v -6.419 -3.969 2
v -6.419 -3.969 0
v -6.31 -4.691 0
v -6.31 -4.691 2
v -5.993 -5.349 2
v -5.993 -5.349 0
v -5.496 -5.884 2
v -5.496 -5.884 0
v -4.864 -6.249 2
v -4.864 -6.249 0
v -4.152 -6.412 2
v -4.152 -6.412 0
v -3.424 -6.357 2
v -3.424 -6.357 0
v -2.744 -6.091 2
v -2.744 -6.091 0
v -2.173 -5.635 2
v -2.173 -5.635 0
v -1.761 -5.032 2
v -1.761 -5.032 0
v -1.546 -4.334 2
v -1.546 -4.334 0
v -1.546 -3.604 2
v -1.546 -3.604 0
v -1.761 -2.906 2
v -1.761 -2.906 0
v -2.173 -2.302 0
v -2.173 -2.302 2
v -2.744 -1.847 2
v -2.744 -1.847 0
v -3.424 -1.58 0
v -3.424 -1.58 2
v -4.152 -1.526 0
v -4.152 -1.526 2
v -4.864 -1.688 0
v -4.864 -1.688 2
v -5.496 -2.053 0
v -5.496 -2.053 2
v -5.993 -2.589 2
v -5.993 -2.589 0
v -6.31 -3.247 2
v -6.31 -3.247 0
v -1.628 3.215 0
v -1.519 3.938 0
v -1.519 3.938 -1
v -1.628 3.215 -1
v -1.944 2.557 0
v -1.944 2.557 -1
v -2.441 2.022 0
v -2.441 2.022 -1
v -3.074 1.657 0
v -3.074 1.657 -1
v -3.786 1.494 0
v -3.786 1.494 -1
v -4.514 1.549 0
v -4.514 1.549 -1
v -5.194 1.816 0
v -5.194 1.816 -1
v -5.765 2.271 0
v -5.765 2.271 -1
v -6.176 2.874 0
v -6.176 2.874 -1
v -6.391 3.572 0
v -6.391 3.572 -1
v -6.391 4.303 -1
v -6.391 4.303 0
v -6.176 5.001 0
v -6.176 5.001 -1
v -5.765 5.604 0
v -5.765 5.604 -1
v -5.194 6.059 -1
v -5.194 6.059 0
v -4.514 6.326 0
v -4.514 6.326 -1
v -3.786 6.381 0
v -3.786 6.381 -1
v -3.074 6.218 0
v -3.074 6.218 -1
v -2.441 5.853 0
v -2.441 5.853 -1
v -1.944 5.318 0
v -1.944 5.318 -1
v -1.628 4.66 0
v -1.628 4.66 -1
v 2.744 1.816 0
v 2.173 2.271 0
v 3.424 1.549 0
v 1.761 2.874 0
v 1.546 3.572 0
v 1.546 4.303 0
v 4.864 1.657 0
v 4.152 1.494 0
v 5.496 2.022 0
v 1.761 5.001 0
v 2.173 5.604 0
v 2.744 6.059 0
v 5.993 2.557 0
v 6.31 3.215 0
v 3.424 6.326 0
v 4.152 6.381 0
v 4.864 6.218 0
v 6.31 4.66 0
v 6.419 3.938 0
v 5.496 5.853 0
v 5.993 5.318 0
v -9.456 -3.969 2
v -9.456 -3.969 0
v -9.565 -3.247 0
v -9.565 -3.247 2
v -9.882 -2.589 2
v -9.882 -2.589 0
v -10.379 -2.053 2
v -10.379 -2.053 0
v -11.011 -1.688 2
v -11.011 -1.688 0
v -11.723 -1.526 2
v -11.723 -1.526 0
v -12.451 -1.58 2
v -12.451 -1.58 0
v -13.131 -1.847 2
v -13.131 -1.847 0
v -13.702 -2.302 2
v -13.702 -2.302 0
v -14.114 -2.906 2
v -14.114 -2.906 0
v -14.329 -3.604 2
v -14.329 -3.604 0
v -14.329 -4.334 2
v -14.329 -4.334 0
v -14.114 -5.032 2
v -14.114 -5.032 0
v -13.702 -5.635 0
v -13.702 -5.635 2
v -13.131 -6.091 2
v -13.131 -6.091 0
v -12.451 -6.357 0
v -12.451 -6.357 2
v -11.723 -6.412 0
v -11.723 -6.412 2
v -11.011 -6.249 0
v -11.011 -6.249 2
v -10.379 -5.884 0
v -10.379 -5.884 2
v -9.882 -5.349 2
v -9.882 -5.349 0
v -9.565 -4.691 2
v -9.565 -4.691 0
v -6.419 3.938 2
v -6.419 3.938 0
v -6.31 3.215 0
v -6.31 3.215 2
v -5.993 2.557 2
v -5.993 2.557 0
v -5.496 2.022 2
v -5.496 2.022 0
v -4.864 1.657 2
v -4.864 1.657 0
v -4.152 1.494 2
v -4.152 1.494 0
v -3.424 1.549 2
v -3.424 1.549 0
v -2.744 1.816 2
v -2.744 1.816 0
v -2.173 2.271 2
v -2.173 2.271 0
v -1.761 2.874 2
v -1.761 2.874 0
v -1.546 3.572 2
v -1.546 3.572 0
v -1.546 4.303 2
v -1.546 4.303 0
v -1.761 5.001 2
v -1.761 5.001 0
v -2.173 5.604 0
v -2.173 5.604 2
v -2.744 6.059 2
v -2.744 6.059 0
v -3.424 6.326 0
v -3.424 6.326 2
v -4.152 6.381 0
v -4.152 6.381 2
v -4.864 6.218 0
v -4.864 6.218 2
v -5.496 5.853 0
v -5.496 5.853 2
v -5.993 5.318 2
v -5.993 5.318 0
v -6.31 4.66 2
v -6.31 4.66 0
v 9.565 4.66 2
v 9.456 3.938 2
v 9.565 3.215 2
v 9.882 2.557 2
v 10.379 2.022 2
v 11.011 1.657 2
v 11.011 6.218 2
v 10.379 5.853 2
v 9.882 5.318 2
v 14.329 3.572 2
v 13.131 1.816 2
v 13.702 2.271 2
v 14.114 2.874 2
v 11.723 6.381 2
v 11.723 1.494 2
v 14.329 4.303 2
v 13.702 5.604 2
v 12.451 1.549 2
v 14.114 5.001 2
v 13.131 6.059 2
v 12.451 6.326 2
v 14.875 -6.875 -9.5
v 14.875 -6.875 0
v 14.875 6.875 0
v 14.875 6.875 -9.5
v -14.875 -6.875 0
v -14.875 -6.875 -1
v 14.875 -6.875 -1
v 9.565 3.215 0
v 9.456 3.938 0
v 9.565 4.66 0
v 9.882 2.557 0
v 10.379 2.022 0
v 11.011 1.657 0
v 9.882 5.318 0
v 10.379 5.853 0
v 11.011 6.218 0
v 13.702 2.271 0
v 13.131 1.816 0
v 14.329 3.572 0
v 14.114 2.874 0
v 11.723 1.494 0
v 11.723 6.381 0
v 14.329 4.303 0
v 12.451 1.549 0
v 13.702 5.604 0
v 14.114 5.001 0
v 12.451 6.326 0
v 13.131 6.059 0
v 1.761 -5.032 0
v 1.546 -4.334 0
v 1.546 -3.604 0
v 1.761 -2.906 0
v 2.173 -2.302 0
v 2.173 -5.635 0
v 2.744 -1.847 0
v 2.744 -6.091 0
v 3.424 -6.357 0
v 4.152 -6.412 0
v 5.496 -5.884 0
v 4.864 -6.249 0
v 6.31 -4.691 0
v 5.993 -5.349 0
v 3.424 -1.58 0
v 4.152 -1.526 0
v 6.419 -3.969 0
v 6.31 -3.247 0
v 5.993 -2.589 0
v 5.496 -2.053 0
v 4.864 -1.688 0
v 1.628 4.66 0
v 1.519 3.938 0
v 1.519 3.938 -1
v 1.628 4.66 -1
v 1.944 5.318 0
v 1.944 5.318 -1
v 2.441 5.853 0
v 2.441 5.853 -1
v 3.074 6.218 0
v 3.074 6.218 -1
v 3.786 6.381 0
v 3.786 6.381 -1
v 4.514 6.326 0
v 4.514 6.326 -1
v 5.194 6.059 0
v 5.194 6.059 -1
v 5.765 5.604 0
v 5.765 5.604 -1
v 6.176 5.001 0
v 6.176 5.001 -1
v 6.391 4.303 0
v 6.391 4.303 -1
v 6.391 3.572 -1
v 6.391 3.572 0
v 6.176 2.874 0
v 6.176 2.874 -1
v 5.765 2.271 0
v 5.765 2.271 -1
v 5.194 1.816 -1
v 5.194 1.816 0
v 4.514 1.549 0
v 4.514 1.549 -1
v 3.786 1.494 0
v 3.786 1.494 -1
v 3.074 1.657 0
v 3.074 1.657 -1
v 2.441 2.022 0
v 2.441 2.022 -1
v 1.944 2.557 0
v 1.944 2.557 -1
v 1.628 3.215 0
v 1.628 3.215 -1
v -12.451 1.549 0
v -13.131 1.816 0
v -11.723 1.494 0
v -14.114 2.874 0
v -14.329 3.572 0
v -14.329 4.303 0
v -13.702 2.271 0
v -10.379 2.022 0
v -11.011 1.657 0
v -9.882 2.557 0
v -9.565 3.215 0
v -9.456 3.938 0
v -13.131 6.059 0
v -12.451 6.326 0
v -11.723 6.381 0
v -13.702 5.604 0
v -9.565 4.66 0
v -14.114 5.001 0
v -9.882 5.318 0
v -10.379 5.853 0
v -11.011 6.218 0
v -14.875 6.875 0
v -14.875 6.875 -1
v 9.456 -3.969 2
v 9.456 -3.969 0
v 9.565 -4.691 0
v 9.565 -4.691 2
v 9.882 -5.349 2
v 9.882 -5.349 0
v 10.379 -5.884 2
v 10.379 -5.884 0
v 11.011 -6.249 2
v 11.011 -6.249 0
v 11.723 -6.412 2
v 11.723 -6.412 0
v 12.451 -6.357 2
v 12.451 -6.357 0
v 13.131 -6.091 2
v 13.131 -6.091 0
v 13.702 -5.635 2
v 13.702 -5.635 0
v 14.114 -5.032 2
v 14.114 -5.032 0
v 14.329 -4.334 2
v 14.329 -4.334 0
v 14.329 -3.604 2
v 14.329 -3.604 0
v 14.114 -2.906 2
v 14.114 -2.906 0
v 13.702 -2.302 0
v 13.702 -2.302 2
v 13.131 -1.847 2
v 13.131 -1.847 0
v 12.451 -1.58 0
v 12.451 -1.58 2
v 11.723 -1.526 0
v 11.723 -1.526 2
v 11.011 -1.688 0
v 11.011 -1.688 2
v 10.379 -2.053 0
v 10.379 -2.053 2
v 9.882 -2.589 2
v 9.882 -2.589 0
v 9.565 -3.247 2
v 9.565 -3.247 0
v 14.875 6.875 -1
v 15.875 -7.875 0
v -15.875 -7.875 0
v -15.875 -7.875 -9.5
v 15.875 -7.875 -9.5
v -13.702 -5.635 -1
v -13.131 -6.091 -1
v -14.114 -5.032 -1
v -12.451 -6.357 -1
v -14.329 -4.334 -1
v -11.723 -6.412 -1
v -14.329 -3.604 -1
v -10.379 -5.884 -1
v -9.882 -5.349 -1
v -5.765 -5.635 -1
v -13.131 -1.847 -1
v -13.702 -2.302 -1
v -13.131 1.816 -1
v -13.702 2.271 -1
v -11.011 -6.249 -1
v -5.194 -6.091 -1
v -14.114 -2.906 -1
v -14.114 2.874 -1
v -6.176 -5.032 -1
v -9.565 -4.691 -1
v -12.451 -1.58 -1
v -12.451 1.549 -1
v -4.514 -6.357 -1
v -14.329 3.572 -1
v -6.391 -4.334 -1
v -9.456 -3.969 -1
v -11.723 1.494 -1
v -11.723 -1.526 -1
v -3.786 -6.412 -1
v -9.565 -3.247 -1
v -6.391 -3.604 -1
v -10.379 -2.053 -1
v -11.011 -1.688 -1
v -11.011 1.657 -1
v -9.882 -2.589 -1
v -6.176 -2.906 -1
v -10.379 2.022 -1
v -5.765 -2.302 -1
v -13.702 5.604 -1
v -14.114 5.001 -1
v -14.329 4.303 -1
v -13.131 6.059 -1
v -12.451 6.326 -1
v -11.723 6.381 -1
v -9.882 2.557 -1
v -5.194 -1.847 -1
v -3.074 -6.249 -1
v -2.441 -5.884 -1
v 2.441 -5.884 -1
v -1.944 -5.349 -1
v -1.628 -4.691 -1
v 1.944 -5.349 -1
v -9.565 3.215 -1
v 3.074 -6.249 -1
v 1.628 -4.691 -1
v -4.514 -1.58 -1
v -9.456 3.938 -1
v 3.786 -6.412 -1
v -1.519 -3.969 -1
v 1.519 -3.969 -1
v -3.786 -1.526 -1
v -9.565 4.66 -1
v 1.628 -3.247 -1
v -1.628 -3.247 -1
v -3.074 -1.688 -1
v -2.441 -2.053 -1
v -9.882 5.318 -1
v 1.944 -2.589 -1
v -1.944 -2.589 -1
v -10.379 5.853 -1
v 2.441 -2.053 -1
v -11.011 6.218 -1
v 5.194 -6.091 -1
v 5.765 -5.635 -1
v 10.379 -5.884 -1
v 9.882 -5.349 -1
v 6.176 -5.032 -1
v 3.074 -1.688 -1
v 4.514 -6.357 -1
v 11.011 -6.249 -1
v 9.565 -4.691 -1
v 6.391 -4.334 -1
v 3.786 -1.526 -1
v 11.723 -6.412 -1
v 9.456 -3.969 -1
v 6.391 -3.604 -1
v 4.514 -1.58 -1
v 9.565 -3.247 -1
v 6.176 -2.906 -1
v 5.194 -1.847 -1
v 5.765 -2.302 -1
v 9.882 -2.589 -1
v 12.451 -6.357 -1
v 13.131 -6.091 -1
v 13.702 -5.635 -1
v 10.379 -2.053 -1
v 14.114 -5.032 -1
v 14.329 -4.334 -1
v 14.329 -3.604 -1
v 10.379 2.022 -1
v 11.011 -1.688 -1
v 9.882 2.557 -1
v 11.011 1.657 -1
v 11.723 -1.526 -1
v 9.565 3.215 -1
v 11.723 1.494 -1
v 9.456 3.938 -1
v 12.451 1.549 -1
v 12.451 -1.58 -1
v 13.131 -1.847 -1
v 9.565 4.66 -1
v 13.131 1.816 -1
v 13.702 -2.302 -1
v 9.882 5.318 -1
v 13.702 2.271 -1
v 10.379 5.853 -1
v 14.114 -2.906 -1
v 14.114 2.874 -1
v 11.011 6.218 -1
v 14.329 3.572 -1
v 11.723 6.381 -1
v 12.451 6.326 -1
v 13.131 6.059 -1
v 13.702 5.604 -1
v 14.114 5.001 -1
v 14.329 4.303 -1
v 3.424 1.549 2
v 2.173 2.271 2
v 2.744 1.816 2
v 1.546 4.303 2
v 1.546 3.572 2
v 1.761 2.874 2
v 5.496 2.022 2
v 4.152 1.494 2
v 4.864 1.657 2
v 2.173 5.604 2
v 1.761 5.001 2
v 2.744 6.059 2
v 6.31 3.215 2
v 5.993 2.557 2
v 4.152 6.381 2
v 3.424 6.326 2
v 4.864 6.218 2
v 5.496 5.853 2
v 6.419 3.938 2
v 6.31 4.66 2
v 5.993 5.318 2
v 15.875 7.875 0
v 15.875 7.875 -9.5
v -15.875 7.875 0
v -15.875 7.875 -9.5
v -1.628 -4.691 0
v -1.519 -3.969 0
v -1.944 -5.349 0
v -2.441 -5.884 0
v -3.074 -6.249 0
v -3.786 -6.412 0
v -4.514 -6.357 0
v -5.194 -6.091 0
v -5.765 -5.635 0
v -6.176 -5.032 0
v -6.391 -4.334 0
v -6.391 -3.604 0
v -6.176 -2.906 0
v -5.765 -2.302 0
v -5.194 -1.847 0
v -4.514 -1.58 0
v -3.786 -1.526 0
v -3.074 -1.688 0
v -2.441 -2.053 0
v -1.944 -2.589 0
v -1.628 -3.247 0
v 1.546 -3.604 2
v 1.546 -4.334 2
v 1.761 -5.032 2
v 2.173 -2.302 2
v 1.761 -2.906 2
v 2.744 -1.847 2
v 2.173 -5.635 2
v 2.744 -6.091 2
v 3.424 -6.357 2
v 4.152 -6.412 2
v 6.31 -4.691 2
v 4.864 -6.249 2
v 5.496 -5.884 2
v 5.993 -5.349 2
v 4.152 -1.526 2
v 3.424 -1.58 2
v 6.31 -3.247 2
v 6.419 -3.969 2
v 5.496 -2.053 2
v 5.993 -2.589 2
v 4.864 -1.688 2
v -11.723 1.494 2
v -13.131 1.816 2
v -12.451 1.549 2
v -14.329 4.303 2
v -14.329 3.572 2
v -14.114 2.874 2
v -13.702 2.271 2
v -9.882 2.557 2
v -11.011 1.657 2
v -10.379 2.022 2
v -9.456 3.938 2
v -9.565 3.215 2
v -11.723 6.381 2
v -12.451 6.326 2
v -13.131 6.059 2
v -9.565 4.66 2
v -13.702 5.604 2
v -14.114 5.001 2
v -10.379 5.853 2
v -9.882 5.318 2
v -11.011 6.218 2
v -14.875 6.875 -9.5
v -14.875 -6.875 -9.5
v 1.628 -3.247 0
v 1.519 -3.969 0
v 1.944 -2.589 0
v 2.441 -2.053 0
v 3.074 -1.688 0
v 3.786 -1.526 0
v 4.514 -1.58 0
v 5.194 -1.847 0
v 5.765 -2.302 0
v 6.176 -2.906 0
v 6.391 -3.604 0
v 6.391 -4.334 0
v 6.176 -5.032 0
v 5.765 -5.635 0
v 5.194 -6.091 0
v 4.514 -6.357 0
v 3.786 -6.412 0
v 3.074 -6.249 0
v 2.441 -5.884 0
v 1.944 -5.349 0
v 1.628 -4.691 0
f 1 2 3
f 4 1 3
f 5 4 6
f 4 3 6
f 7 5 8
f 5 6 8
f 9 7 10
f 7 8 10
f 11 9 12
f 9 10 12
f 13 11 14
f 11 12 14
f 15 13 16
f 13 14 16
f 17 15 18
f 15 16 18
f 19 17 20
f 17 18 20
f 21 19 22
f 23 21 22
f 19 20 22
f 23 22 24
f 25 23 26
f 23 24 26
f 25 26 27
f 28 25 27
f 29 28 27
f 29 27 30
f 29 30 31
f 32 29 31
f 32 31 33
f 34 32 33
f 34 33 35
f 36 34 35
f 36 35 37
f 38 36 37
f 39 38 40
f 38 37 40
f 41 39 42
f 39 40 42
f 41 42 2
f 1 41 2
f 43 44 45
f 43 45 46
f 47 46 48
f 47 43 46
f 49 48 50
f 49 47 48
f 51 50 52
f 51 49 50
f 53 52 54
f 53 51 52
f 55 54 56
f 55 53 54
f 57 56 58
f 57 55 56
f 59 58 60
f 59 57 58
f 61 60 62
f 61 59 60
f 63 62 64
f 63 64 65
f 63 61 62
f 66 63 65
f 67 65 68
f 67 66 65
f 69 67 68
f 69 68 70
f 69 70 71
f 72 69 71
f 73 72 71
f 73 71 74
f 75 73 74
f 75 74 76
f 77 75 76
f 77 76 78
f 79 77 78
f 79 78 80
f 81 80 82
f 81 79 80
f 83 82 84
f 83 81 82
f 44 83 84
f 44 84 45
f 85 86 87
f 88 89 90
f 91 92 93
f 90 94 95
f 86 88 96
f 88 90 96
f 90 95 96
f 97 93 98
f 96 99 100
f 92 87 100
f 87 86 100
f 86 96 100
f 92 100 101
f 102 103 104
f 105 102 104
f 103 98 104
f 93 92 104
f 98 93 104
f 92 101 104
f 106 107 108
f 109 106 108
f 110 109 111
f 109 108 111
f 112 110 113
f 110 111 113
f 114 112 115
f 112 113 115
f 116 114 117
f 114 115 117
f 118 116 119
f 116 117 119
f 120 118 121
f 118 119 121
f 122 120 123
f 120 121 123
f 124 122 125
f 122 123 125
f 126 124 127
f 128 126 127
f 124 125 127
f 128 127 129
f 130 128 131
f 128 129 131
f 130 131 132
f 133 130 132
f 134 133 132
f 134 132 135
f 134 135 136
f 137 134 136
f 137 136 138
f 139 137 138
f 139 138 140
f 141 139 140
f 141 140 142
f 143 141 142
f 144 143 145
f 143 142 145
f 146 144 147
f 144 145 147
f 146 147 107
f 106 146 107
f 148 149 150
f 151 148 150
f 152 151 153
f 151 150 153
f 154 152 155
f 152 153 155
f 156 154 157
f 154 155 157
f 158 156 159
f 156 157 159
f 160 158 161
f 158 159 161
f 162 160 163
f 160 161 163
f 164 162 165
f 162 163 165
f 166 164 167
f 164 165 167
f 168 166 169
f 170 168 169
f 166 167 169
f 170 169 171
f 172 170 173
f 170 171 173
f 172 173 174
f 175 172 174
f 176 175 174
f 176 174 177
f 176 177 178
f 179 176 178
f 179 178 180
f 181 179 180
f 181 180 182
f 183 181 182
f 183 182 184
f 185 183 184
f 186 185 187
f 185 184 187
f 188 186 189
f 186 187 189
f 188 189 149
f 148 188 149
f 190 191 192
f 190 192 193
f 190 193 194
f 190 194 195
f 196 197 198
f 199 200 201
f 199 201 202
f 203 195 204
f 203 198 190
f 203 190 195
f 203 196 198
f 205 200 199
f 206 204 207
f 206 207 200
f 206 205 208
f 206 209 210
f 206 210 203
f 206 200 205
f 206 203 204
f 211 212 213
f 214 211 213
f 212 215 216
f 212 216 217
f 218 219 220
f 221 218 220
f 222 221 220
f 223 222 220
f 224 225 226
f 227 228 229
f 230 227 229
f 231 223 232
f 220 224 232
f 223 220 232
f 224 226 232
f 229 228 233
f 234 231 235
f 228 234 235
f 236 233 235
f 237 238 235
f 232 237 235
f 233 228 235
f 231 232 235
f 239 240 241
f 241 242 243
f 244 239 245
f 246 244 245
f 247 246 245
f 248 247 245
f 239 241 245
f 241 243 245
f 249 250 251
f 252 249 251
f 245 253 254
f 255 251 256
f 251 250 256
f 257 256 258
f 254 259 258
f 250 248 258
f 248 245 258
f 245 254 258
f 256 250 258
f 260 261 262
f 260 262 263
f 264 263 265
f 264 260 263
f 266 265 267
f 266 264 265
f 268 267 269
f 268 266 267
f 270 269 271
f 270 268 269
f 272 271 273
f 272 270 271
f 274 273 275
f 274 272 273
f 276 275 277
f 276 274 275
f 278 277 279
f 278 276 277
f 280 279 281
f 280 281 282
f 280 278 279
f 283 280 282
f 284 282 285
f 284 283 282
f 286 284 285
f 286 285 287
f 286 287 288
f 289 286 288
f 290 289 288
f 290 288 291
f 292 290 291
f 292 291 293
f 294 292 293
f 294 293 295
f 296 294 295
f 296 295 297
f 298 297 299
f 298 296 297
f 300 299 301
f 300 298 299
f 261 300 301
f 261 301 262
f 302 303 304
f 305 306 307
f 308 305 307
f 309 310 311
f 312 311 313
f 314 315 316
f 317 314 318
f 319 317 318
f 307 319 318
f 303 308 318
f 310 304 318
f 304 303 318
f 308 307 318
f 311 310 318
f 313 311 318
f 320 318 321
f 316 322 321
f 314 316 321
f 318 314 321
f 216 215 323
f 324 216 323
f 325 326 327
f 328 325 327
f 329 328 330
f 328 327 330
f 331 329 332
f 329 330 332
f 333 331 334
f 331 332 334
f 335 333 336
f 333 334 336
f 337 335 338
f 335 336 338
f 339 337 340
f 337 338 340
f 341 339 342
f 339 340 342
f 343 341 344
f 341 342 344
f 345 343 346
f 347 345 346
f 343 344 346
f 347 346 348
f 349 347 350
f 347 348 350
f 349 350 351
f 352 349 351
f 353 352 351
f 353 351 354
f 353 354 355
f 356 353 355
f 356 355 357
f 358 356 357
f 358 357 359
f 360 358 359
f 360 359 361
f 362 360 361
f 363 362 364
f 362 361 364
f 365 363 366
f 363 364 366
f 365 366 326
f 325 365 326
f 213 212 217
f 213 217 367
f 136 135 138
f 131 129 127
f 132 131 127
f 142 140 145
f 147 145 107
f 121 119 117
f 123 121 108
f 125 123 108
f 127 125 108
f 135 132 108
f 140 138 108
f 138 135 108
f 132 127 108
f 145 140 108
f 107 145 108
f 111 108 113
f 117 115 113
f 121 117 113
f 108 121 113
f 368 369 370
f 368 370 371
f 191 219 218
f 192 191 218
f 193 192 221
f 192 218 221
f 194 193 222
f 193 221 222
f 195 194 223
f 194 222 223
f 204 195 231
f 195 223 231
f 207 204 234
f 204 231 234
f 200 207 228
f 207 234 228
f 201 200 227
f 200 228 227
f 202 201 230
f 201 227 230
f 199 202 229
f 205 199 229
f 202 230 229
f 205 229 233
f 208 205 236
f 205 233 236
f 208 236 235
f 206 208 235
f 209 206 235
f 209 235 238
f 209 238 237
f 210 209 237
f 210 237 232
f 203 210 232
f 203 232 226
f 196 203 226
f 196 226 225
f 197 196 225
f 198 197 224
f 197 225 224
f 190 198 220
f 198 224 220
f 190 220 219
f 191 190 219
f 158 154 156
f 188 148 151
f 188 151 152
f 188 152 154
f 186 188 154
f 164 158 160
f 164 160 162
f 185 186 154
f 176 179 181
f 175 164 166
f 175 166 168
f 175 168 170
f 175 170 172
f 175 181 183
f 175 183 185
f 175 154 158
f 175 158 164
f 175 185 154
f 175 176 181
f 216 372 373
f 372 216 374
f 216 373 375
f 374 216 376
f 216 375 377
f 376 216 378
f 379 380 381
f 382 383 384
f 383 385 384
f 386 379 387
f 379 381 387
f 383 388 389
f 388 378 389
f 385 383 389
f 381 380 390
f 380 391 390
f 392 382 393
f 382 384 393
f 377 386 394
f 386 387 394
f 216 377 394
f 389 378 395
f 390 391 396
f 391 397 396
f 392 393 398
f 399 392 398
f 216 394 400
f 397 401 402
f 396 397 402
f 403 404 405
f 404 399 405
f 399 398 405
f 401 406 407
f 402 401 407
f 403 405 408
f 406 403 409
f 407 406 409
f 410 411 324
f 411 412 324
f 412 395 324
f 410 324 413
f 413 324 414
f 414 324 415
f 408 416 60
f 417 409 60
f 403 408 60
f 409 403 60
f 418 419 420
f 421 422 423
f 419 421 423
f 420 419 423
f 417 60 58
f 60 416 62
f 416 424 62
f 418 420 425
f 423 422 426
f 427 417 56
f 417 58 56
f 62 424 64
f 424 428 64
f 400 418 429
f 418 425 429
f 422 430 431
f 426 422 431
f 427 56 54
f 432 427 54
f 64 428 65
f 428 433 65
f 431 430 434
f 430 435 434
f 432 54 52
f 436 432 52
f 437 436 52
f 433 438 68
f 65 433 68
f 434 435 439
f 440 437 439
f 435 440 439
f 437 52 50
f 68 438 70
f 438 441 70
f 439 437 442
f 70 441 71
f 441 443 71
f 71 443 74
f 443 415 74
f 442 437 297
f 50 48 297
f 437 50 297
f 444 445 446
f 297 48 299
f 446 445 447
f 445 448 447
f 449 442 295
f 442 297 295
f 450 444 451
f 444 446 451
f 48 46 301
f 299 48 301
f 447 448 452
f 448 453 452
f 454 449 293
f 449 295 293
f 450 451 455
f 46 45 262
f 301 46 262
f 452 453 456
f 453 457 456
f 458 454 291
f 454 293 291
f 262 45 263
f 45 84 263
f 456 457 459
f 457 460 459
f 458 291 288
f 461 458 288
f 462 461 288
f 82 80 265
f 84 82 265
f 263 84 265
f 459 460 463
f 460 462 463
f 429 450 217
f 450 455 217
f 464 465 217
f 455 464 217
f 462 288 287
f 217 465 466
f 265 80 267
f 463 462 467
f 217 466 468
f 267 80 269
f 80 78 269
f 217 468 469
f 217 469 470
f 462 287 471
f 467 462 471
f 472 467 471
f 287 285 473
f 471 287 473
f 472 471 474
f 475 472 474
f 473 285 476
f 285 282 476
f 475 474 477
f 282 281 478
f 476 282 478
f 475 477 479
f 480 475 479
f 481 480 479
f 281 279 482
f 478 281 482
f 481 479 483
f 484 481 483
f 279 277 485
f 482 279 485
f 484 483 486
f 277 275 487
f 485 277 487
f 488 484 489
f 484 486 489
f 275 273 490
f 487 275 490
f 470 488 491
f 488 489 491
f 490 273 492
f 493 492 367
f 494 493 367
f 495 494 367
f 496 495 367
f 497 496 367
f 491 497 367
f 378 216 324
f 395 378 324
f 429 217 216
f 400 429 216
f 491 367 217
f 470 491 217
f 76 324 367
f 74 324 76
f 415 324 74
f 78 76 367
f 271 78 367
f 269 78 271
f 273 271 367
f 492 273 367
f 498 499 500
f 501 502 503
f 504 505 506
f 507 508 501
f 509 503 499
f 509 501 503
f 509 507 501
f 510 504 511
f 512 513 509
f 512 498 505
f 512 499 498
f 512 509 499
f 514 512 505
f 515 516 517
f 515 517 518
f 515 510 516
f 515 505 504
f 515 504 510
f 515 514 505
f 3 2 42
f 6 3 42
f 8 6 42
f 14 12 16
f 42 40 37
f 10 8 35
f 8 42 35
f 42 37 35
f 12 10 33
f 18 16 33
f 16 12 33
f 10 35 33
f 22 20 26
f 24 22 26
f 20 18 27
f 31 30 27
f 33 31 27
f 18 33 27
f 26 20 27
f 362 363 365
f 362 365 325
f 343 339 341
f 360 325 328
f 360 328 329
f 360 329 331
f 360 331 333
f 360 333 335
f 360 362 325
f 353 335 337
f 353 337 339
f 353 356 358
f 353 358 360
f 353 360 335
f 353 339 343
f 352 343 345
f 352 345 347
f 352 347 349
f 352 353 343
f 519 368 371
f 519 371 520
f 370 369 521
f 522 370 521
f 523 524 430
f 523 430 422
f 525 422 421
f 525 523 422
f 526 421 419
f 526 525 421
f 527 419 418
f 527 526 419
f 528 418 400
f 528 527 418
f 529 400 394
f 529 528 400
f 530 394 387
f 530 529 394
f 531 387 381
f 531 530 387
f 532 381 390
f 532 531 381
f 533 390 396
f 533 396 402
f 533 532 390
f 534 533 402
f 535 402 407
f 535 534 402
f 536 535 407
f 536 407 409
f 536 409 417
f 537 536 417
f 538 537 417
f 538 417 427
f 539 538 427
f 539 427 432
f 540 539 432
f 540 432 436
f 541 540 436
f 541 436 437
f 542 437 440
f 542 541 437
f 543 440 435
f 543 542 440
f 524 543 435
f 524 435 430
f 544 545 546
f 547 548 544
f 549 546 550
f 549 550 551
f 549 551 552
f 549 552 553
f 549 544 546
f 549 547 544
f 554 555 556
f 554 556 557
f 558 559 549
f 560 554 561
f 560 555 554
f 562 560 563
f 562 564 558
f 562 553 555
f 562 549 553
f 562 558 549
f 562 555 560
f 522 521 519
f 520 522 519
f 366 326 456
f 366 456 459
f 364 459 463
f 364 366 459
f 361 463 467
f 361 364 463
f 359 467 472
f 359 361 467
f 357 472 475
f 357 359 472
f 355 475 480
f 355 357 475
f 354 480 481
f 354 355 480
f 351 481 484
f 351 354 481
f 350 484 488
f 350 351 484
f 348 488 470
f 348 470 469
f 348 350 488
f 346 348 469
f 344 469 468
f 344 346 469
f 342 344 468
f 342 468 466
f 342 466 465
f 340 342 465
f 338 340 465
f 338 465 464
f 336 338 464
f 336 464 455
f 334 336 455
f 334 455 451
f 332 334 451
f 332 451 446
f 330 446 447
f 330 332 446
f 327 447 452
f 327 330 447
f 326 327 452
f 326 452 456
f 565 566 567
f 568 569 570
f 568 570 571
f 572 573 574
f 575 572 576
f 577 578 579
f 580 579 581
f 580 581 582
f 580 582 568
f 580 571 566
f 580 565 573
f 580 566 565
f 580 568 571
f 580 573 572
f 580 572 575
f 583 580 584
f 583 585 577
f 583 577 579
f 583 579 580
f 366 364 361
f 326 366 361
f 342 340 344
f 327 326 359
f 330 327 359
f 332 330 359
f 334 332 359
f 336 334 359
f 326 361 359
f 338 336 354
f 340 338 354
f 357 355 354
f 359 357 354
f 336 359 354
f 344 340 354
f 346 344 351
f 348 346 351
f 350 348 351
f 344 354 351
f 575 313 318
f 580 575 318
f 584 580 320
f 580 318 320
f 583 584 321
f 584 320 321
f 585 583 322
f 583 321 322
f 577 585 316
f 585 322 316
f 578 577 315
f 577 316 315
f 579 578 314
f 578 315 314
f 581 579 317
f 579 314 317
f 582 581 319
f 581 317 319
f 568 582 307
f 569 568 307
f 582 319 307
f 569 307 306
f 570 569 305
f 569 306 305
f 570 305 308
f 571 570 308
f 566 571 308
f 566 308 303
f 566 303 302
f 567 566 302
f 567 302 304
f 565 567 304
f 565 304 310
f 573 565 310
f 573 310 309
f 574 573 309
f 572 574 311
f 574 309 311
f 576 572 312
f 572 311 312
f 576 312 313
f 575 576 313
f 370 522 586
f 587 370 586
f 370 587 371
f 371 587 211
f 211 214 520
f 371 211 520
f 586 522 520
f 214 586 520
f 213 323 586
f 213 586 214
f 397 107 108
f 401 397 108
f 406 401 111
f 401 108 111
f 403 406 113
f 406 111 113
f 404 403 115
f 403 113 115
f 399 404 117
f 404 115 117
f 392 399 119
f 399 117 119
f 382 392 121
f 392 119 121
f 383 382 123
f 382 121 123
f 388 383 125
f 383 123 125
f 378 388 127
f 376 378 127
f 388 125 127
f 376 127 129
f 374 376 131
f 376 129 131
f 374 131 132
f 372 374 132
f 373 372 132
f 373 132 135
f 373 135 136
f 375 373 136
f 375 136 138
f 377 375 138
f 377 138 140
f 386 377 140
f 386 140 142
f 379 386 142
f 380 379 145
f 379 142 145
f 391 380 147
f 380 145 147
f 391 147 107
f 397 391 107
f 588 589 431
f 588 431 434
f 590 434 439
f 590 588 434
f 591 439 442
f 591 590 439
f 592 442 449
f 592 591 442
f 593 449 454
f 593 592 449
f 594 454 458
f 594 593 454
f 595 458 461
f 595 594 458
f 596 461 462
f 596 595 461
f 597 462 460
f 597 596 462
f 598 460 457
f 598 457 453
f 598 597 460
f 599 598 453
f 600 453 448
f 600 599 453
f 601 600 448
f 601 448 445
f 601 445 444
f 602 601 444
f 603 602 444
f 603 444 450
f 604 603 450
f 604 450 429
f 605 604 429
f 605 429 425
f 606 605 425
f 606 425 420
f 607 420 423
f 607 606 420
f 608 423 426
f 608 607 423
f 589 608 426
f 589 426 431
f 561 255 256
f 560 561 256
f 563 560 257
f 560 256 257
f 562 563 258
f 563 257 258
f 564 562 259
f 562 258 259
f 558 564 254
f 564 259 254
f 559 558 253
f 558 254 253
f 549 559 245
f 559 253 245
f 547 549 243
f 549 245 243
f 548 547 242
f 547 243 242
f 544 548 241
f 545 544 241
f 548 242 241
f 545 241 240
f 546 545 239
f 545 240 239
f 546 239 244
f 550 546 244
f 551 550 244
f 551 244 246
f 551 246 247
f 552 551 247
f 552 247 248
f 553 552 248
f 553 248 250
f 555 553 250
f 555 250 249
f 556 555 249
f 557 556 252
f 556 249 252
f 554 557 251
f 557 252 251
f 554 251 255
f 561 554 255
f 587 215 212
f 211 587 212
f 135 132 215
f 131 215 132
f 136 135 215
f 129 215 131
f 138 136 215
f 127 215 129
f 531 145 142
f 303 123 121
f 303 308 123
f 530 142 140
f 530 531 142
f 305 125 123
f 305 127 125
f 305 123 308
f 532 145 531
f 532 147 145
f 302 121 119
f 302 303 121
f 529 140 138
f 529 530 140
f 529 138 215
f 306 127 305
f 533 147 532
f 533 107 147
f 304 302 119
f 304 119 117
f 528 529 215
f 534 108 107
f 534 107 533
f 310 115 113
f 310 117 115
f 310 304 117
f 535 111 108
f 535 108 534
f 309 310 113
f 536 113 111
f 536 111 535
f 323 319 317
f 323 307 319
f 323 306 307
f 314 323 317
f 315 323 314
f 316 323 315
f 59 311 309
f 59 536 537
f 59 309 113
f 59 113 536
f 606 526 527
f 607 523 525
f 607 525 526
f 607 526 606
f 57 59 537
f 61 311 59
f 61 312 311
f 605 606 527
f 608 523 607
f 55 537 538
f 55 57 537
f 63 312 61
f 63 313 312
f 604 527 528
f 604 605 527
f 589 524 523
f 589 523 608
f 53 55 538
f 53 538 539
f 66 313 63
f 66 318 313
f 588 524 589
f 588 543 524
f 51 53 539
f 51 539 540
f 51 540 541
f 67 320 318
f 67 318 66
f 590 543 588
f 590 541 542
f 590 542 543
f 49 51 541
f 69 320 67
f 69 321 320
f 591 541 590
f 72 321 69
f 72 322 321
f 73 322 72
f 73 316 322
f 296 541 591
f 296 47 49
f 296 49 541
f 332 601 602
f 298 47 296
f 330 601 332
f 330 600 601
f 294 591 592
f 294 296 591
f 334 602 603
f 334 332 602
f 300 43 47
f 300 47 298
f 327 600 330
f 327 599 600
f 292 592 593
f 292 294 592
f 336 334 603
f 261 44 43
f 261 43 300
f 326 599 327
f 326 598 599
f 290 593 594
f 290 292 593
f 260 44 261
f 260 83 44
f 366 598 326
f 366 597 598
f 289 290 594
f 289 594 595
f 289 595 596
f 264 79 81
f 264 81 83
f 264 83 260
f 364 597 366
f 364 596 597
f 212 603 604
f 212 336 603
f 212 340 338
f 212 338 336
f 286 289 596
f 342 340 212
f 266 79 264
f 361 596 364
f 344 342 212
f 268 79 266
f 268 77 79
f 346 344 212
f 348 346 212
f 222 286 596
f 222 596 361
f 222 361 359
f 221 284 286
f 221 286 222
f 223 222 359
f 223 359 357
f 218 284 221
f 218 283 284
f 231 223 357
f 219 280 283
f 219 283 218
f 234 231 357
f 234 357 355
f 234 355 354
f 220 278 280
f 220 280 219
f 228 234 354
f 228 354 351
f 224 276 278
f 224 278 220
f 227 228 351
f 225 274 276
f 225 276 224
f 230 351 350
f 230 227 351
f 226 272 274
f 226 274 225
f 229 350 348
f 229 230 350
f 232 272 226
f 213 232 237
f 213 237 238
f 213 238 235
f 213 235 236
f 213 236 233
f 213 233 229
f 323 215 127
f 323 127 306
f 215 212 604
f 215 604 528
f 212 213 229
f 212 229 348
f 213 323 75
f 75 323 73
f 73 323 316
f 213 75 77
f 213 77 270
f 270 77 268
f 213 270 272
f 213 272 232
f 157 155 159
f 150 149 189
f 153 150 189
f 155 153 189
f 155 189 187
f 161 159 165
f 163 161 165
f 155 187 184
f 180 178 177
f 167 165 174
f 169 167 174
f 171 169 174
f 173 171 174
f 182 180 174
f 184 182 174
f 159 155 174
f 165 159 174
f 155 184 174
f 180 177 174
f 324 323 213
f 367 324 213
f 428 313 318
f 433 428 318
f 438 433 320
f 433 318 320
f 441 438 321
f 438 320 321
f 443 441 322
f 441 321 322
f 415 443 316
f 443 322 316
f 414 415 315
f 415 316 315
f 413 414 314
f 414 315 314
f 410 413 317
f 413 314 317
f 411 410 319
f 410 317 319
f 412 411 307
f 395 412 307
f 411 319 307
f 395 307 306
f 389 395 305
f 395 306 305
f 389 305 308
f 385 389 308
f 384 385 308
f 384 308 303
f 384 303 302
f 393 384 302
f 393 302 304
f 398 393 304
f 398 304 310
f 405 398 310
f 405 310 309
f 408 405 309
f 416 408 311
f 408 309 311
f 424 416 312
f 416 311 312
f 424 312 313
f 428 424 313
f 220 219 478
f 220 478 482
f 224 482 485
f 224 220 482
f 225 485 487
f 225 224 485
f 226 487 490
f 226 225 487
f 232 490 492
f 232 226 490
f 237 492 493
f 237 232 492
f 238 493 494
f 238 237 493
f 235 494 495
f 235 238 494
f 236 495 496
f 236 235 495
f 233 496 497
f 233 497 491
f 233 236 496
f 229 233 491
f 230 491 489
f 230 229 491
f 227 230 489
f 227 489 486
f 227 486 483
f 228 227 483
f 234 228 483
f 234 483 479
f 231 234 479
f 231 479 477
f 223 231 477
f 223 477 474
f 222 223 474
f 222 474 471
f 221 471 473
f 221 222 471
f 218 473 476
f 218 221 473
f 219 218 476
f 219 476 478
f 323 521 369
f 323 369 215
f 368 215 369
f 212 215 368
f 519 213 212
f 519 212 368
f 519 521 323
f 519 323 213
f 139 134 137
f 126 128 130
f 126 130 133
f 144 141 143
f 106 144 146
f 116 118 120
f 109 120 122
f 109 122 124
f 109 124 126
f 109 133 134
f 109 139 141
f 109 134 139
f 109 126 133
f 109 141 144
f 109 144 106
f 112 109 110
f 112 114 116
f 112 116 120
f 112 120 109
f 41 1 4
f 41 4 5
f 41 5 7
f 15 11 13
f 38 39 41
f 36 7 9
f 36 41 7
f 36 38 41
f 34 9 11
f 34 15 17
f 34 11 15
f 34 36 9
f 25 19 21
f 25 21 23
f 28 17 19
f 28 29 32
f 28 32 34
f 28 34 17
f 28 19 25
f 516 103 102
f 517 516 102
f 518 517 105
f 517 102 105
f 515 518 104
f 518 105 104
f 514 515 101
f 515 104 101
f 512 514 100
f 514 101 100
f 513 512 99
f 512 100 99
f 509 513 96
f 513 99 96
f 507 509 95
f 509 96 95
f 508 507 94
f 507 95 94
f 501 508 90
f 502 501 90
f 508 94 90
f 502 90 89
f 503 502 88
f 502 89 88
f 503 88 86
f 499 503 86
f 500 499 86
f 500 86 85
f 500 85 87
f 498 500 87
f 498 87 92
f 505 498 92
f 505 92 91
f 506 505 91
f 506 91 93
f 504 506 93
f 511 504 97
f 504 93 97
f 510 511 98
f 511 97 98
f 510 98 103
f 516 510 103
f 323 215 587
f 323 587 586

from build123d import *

# Parameters (mm, degrees)
F0_R     = 2.45
F1_DEPTH = 2
F0_W     = 29.75
F0_H     = 13.75
F2_DEPTH = 1
F0_W_2   = 31.75
F0_H_2   = 15.75
F3_DEPTH = 9.5


with BuildPart() as f1:
    # F0 (on Top) → F1 (new body)
    with BuildSketch(Plane.XY):
        with Locations((-11.90625, 3.9375)):
            Circle(F0_R)
        with BuildLine():
            Line((-3.96875, 3.9375), (-1.51875, 3.9375))
            ThreePointArc((-1.51875, 3.9375), (-3.96875, 6.3875), (-6.41875, 3.9375))
            Line((-6.41875, 3.9375), (-3.96875, 3.9375))
        make_face()
        with BuildLine():
            ThreePointArc((-6.41875, 3.9375), (-3.96875, 1.4875), (-1.51875, 3.9375))
            Line((-1.51875, 3.9375), (-3.96875, 3.9375))
            Line((-3.96875, 3.9375), (-6.41875, 3.9375))
        make_face()
        with BuildLine():
            Line((3.96875, 3.9375), (1.51875, 3.9375))
            ThreePointArc((1.51875, 3.9375), (3.96875, 1.4875), (6.41875, 3.9375))
            Line((6.41875, 3.9375), (3.96875, 3.9375))
        make_face()
        with BuildLine():
            ThreePointArc((14.35625, 3.9375), (11.90625, 6.3875), (9.45625, 3.9375))
            ThreePointArc((9.45625, 3.9375), (11.90625, 1.4875), (14.35625, 3.9375))
        make_face()
        with BuildLine():
            ThreePointArc((6.41875, 3.9375), (3.96875, 6.3875), (1.51875, 3.9375))
            Line((1.51875, 3.9375), (3.96875, 3.9375))
            Line((3.96875, 3.9375), (6.41875, 3.9375))
        make_face()
        with Locations((-11.90625, -3.96875)):
            Circle(F0_R)
        with BuildLine():
            Line((-3.96875, -3.96875), (-1.51875, -3.96875))
            ThreePointArc((-1.51875, -3.96875), (-3.96875, -1.51875), (-6.41875, -3.96875))
            Line((-6.41875, -3.96875), (-3.96875, -3.96875))
        make_face()
        with BuildLine():
            ThreePointArc((-6.41875, -3.96875), (-3.96875, -6.41875), (-1.51875, -3.96875))
            Line((-1.51875, -3.96875), (-3.96875, -3.96875))
            Line((-3.96875, -3.96875), (-6.41875, -3.96875))
        make_face()
        with BuildLine():
            Line((3.96875, -3.96875), (1.51875, -3.96875))
            ThreePointArc((1.51875, -3.96875), (3.96875, -6.41875), (6.41875, -3.96875))
            Line((6.41875, -3.96875), (3.96875, -3.96875))
        make_face()
        with BuildLine():
            ThreePointArc((6.41875, -3.96875), (3.96875, -1.51875), (1.51875, -3.96875))
            Line((1.51875, -3.96875), (3.96875, -3.96875))
            Line((3.96875, -3.96875), (6.41875, -3.96875))
        make_face()
        with BuildLine():
            ThreePointArc((14.35625, -3.96875), (11.90625, -1.51875), (9.45625, -3.96875))
            ThreePointArc((9.45625, -3.96875), (11.90625, -6.41875), (14.35625, -3.96875))
        make_face()
    extrude(amount=F1_DEPTH)


with BuildPart() as f2:
    # F0 (on Top) → F2 (new body)
    with BuildSketch(Plane.XY):
        Rectangle(F0_W, F0_H)
        with Locations((-11.90625, -3.96875)):
            Circle(F0_R, mode=Mode.SUBTRACT)
        with BuildLine():
            ThreePointArc((-6.41875, -3.96875), (-3.96875, -1.51875), (-1.51875, -3.96875))
            ThreePointArc((-1.51875, -3.96875), (-3.96875, -6.41875), (-6.41875, -3.96875))
        make_face(mode=Mode.SUBTRACT)
        with BuildLine():
            ThreePointArc((6.41875, -3.96875), (3.96875, -6.41875), (1.51875, -3.96875))
            ThreePointArc((1.51875, -3.96875), (3.96875, -1.51875), (6.41875, -3.96875))
        make_face(mode=Mode.SUBTRACT)
        with BuildLine():
            ThreePointArc((14.35625, -3.96875), (11.90625, -6.41875), (9.45625, -3.96875))
            ThreePointArc((9.45625, -3.96875), (11.90625, -1.51875), (14.35625, -3.96875))
        make_face(mode=Mode.SUBTRACT)
        with Locations((-11.90625, 3.9375)):
            Circle(F0_R, mode=Mode.SUBTRACT)
        with BuildLine():
            ThreePointArc((-6.41875, 3.9375), (-3.96875, 6.3875), (-1.51875, 3.9375))
            ThreePointArc((-1.51875, 3.9375), (-3.96875, 1.4875), (-6.41875, 3.9375))
        make_face(mode=Mode.SUBTRACT)
        with BuildLine():
            ThreePointArc((6.41875, 3.9375), (3.96875, 1.4875), (1.51875, 3.9375))
            ThreePointArc((1.51875, 3.9375), (3.96875, 6.3875), (6.41875, 3.9375))
        make_face(mode=Mode.SUBTRACT)
        with BuildLine():
            ThreePointArc((14.35625, 3.9375), (11.90625, 1.4875), (9.45625, 3.9375))
            ThreePointArc((9.45625, 3.9375), (11.90625, 6.3875), (14.35625, 3.9375))
        make_face(mode=Mode.SUBTRACT)
    extrude(amount=-F2_DEPTH)


with BuildPart() as f3:
    # F0 (on Top) → F3 (new body)
    with BuildSketch(Plane.XY):
        Rectangle(F0_W_2, F0_H_2)
        Rectangle(F0_W, F0_H, mode=Mode.SUBTRACT)
    extrude(amount=-F3_DEPTH)


solid = Compound([f1.part, f2.part, f3.part])
